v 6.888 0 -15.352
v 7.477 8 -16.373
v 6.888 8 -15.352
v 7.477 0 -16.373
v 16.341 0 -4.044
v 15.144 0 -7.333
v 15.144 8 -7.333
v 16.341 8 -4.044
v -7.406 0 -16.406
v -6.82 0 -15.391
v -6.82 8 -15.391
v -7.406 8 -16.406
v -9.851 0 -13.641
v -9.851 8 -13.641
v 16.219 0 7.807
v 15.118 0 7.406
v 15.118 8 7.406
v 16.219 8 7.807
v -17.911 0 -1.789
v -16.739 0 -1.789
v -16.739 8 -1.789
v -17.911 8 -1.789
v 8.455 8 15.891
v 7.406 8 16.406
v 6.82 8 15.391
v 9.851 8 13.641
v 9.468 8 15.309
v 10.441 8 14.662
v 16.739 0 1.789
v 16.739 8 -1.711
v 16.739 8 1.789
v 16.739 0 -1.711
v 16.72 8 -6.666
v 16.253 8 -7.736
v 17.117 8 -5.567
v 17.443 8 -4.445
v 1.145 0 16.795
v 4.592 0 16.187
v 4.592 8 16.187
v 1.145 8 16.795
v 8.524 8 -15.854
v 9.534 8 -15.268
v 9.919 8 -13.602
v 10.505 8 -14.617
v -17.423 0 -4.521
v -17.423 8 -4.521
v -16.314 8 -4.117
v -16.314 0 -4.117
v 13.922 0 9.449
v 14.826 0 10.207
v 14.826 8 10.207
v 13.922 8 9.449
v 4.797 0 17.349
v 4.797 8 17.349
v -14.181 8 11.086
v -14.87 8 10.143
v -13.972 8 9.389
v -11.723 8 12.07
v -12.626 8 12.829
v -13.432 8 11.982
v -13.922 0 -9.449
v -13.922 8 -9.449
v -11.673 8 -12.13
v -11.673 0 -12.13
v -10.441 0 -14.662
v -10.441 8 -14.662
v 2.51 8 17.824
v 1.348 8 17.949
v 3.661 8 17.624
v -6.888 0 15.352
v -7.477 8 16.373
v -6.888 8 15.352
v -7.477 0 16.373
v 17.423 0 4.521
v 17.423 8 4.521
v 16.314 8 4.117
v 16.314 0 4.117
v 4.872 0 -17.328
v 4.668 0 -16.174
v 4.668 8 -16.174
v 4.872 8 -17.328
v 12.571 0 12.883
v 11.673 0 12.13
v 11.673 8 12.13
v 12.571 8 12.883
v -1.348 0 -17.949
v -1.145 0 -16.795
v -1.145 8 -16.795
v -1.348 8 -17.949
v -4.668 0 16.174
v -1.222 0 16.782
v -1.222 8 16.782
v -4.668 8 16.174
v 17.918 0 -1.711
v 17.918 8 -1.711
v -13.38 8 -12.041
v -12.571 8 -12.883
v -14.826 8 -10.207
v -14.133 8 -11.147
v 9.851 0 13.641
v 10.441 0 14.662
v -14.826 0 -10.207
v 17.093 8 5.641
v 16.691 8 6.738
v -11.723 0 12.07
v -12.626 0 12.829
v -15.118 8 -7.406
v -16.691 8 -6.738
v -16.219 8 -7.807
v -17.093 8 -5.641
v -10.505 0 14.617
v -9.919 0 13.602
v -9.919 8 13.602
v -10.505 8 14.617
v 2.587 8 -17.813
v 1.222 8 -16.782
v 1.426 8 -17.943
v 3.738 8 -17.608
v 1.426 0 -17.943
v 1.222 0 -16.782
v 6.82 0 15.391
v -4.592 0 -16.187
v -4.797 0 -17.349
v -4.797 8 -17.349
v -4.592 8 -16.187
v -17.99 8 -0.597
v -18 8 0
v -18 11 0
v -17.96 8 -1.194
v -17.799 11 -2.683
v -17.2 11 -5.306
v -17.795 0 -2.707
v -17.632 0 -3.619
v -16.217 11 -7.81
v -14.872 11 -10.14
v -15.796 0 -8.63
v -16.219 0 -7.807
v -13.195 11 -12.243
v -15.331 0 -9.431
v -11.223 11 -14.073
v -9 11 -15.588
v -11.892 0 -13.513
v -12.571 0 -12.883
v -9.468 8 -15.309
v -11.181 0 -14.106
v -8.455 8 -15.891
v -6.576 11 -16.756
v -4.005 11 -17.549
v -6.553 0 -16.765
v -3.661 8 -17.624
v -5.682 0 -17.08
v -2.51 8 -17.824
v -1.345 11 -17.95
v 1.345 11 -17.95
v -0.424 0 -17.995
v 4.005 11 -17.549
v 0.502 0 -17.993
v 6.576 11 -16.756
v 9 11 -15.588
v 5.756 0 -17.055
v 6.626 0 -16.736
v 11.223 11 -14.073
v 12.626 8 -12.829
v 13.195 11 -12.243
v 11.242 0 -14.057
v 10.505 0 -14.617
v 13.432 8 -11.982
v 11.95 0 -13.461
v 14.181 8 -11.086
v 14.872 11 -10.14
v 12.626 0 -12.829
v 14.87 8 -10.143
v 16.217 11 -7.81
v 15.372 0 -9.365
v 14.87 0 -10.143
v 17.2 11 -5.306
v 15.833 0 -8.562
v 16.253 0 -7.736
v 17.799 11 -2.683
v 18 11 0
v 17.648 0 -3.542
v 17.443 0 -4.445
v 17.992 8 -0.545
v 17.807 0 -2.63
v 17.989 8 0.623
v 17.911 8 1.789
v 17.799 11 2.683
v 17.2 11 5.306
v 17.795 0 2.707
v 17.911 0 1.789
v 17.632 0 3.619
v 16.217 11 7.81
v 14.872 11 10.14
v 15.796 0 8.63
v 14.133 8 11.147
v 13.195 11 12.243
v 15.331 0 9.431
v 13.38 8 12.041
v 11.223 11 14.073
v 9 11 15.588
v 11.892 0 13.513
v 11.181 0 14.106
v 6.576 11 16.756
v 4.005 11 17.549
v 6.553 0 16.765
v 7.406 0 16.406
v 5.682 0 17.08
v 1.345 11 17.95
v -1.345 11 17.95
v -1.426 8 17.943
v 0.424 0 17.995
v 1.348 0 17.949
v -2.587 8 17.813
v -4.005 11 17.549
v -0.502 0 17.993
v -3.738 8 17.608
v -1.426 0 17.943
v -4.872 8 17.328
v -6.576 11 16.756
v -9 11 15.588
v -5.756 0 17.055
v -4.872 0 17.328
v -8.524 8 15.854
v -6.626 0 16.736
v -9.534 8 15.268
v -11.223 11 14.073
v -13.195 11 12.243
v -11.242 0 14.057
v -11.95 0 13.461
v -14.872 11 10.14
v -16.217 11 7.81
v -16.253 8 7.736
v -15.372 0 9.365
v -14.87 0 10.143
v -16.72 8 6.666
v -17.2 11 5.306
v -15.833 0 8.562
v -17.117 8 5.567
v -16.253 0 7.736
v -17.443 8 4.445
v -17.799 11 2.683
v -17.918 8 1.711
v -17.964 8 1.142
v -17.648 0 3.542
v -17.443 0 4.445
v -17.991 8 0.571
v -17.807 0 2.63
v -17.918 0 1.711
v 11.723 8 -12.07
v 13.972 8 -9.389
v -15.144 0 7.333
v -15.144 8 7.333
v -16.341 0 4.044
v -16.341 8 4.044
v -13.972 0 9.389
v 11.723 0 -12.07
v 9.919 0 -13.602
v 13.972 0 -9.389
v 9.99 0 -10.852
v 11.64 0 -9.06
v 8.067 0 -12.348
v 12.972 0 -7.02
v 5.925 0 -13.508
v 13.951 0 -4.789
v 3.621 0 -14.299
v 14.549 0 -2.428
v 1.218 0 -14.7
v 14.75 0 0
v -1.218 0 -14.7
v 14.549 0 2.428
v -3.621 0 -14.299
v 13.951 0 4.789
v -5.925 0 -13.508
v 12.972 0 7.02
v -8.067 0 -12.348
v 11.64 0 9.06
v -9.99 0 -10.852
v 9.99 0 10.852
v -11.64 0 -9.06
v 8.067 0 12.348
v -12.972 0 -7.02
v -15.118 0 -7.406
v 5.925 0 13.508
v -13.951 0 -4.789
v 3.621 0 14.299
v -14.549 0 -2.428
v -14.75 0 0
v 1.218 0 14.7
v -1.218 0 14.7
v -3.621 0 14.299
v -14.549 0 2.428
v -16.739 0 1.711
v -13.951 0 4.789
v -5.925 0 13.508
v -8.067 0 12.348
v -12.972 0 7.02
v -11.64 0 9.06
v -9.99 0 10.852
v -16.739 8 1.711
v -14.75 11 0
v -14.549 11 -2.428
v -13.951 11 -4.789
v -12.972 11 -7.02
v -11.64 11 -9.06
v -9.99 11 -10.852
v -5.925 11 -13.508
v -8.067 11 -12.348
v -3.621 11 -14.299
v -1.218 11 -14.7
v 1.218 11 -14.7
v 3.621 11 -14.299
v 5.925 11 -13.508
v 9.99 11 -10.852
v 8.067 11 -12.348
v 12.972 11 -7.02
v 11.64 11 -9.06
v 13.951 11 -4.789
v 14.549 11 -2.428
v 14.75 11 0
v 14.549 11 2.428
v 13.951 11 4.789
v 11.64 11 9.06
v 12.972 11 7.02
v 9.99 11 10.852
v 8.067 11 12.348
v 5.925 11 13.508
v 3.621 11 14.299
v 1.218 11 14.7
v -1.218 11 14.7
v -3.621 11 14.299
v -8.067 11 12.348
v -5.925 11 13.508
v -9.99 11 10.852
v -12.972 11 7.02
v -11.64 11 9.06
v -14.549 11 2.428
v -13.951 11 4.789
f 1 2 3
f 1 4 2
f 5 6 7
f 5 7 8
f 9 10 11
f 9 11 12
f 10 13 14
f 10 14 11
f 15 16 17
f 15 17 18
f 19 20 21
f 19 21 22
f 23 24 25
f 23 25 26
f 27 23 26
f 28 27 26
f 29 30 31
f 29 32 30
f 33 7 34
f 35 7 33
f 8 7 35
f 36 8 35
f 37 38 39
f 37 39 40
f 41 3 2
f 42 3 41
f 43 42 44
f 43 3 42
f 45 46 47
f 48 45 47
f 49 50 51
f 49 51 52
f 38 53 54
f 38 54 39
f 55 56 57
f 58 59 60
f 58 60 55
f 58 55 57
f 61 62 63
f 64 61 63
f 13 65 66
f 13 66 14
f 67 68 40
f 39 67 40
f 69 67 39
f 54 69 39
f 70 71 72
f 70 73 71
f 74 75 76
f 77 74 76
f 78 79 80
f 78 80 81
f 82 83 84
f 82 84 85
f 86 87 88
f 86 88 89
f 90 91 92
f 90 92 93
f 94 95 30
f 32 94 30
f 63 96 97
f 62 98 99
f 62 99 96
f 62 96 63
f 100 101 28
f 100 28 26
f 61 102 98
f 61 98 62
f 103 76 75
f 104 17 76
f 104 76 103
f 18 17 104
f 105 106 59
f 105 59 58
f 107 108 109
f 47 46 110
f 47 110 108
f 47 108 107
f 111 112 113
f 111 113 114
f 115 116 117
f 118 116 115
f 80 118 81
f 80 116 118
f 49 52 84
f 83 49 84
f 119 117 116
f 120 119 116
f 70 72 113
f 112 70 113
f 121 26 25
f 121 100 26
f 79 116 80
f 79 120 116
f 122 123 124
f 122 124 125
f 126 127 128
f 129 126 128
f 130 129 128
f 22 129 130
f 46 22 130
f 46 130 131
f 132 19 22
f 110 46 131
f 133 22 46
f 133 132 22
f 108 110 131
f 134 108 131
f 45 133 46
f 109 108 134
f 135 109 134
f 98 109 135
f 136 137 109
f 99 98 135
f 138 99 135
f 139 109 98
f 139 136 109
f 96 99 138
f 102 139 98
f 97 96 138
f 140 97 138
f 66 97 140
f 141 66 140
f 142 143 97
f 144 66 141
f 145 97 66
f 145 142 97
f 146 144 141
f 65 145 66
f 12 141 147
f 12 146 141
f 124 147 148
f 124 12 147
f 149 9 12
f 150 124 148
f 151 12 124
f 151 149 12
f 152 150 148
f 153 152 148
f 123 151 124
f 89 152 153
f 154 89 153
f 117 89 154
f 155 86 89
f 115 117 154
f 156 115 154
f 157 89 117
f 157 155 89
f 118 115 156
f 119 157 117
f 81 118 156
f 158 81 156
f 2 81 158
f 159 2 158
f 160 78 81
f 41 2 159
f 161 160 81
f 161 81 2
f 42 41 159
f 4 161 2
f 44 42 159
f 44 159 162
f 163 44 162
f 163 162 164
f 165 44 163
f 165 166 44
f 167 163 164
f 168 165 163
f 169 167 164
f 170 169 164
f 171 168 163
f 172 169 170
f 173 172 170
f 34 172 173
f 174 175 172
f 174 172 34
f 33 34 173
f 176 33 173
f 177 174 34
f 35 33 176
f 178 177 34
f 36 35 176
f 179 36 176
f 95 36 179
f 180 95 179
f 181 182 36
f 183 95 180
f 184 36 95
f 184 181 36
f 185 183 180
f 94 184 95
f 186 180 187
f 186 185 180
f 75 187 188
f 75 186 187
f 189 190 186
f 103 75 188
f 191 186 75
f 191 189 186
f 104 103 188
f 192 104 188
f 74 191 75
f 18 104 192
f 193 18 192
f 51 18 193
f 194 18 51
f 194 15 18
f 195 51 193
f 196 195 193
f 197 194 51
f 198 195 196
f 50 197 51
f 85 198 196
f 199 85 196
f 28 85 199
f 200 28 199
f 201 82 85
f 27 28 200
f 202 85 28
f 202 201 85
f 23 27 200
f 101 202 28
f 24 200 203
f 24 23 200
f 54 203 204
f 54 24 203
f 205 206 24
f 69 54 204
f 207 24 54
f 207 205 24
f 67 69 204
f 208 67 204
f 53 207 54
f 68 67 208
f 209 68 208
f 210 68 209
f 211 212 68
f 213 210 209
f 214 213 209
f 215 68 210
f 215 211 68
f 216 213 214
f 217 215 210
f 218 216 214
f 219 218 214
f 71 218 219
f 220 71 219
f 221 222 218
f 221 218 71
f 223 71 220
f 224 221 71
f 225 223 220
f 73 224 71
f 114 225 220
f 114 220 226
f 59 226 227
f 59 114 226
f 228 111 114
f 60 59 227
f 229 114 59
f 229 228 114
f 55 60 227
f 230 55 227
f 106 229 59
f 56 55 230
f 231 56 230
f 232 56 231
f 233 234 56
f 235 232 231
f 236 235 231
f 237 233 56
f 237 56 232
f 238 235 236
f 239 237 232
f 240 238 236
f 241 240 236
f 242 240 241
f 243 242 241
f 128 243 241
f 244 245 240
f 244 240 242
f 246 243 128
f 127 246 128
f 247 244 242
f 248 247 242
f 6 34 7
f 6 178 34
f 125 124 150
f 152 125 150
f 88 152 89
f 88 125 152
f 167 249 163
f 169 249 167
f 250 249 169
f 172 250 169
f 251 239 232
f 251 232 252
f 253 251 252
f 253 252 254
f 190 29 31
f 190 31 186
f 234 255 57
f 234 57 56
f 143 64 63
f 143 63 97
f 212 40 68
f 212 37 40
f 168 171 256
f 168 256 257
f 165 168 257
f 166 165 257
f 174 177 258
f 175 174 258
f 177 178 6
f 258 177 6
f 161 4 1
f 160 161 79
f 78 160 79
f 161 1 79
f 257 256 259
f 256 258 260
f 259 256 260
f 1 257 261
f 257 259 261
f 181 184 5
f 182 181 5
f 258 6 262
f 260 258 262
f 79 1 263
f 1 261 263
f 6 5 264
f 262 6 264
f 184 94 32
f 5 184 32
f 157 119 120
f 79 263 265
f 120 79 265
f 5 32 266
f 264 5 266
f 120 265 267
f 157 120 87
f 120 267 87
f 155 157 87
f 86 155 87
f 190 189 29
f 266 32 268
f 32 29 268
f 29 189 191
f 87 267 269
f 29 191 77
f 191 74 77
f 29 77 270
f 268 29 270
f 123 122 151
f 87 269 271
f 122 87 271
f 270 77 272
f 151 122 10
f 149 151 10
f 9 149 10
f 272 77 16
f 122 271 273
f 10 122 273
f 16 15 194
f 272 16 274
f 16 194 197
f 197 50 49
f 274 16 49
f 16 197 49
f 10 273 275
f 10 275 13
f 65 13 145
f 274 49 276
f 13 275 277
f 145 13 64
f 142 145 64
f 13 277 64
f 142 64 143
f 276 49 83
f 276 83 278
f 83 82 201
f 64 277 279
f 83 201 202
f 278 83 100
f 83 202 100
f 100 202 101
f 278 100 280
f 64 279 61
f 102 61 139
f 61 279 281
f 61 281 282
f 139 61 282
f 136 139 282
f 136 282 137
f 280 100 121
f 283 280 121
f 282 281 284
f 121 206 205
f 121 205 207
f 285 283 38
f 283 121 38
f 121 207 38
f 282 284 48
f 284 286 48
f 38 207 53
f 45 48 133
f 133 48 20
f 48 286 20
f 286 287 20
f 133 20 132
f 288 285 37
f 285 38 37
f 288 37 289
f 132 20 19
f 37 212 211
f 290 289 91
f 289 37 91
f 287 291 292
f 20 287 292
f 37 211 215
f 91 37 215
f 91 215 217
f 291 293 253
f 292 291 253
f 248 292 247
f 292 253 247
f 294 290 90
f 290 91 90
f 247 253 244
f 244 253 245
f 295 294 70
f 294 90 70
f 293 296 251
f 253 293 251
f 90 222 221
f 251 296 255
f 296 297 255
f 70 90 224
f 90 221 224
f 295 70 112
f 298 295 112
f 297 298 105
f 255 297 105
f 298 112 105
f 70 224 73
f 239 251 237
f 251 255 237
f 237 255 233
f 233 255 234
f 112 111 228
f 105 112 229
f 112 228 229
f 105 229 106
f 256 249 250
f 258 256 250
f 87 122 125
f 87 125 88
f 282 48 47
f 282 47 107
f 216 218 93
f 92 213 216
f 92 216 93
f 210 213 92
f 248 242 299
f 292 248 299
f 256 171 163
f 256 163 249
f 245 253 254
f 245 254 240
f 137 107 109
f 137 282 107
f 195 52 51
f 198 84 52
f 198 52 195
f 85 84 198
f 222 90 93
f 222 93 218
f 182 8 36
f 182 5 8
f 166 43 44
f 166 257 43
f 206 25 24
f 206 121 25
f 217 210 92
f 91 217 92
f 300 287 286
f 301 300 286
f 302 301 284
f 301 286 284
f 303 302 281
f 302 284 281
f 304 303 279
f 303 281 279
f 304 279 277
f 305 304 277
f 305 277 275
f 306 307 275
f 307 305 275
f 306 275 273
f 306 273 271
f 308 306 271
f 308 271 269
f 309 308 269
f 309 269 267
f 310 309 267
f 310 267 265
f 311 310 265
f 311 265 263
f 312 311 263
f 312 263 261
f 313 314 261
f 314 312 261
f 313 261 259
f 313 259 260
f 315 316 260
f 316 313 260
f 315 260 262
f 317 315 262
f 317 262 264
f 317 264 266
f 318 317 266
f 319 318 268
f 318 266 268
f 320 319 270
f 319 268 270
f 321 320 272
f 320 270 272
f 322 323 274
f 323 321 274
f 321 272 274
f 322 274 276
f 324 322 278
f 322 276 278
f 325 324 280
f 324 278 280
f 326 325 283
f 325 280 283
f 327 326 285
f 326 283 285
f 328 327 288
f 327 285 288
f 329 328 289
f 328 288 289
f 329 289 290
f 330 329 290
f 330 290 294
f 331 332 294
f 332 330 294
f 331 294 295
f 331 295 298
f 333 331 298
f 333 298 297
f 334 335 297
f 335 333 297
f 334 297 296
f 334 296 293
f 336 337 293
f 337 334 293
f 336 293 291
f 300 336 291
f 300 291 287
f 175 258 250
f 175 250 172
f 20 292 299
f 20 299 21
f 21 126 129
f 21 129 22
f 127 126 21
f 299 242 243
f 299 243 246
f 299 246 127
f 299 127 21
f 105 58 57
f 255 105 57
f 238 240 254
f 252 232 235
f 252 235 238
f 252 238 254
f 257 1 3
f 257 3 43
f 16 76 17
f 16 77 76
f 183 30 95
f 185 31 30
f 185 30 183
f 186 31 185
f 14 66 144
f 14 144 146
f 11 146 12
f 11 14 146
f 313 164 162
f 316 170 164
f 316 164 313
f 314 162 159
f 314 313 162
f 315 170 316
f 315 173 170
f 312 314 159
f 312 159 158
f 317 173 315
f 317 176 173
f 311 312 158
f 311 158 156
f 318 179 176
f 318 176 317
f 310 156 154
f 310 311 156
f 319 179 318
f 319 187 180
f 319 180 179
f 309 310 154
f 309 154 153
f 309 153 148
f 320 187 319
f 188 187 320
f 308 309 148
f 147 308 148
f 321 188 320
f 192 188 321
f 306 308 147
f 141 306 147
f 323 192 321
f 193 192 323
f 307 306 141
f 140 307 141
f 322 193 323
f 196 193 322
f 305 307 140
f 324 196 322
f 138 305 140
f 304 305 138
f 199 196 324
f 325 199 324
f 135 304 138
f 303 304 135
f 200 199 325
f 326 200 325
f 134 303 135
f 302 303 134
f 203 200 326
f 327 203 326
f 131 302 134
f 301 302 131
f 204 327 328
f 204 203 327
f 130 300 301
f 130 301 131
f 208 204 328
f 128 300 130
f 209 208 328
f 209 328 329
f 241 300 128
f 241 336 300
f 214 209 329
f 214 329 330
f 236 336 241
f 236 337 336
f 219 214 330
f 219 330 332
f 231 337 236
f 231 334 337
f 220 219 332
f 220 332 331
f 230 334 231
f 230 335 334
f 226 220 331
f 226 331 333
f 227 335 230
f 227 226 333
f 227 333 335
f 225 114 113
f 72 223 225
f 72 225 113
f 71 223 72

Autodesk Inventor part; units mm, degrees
ref_plane "YZ Plane" through (0, 0, 0) normal (1, 0, 0) x (0, 1, 0)
ref_plane "XZ Plane" through (0, 0, 0) normal (0, 1, 0) x (-1, 0, 0)
ref_plane "XY Plane" through (0, 0, 0) normal (0, 0, 1) x (1, 0, 0)
sketch "Sketch1" plane through (0, 0, 0) normal (0, 1, 0) x (-1, 0, 0)
  circle A0 centre (0, 0) radius 14.75
  circle A1 centre (0, 0) radius 18
  dimension "d0" = 29.5
  dimension "d1" = 36
extrude "Extrusion1" add sketch "Sketch1" along normal blind 11
thread "Thread1" size "M30x1" class "6H" standard "ANSI Metric M Profile" full length
sketch "Sketch2" plane through (0, 0, 0) normal (0, -1, 0) x (1, 0, 0)
  circle A0 centre (0, 0) radius 14.75 projected
  line L0 (-18.761, 1.7111) -> (-16.7388, 1.7111)
  line L1 (-16.7388, 1.7111) -> (-16.7388, -1.7889)
  line L2 (-16.7388, -1.7889) -> (-18.761, -1.7889)
  line L3 (-18.761, -1.7889) -> (-18.761, 1.7111)
  line L4 (-18.2148, -4.8087) -> (-16.3145, -4.1171)
  line L5 (-16.3145, -4.1171) -> (-15.1175, -7.406)
  line L6 (-15.1175, -7.406) -> (-17.0177, -8.0976)
  line L7 (-17.0177, -8.0976) -> (-18.2148, -4.8087)
  line L8 (-15.4716, -10.7485) -> (-13.9225, -9.4487)
  line L9 (-13.9225, -9.4487) -> (-11.6728, -12.1298)
  line L10 (-11.6728, -12.1298) -> (-13.2219, -13.4297)
  line L11 (-13.2219, -13.4297) -> (-15.4716, -10.7485)
  line L12 (-10.8624, -15.3919) -> (-9.8512, -13.6406)
  line L13 (-9.8512, -13.6406) -> (-6.8202, -15.3906)
  line L14 (-6.8202, -15.3906) -> (-7.8313, -17.1419)
  line L15 (-7.8313, -17.1419) -> (-10.8624, -15.3919)
  line L16 (-4.9429, -18.1788) -> (-4.5918, -16.1873)
  line L17 (-4.5918, -16.1873) -> (-1.1449, -16.7951)
  line L18 (-1.1449, -16.7951) -> (-1.4961, -18.7866)
  line L19 (-1.4961, -18.7866) -> (-4.9429, -18.1788)
  line L20 (1.5727, -18.7731) -> (1.2215, -16.7816)
  line L21 (1.2215, -16.7816) -> (4.6684, -16.1738)
  line L22 (4.6684, -16.1738) -> (5.0195, -18.1653)
  line L23 (5.0195, -18.1653) -> (1.5727, -18.7731)
  line L24 (7.8986, -17.103) -> (6.8875, -15.3517)
  line L25 (6.8875, -15.3517) -> (9.9186, -13.6017)
  line L26 (9.9186, -13.6017) -> (10.9297, -15.353)
  line L27 (10.9297, -15.353) -> (7.8986, -17.103)
  line L28 (13.2719, -13.3701) -> (11.7228, -12.0703)
  line L29 (11.7228, -12.0703) -> (13.9725, -9.3891)
  line L30 (13.9725, -9.3891) -> (15.5216, -10.689)
  line L31 (15.5216, -10.689) -> (13.2719, -13.3701)
  line L32 (17.0443, -8.0246) -> (15.1441, -7.3329)
  line L33 (15.1441, -7.3329) -> (16.3411, -4.044)
  line L34 (16.3411, -4.044) -> (18.2414, -4.7356)
  line L35 (18.2414, -4.7356) -> (17.0443, -8.0246)
  line L36 (18.761, -1.7111) -> (16.7388, -1.7111)
  line L37 (16.7388, -1.7111) -> (16.7388, 1.7889)
  line L38 (16.7388, 1.7889) -> (18.761, 1.7889)
  line L39 (18.761, 1.7889) -> (18.761, -1.7111)
  line L40 (18.2148, 4.8087) -> (16.3145, 4.1171)
  line L41 (16.3145, 4.1171) -> (15.1175, 7.406)
  line L42 (15.1175, 7.406) -> (17.0177, 8.0976)
  line L43 (17.0177, 8.0976) -> (18.2148, 4.8087)
  line L44 (15.4716, 10.7485) -> (13.9225, 9.4487)
  line L45 (13.9225, 9.4487) -> (11.6728, 12.1298)
  line L46 (11.6728, 12.1298) -> (13.2219, 13.4297)
  line L47 (13.2219, 13.4297) -> (15.4716, 10.7485)
  line L48 (10.8624, 15.3919) -> (9.8512, 13.6406)
  line L49 (9.8512, 13.6406) -> (6.8202, 15.3906)
  line L50 (6.8202, 15.3906) -> (7.8313, 17.1419)
  line L51 (7.8313, 17.1419) -> (10.8624, 15.3919)
  line L52 (4.9429, 18.1788) -> (4.5918, 16.1873)
  line L53 (4.5918, 16.1873) -> (1.1449, 16.7951)
  line L54 (1.1449, 16.7951) -> (1.4961, 18.7866)
  line L55 (1.4961, 18.7866) -> (4.9429, 18.1788)
  line L56 (-1.5727, 18.7731) -> (-1.2215, 16.7816)
  line L57 (-1.2215, 16.7816) -> (-4.6684, 16.1738)
  line L58 (-4.6684, 16.1738) -> (-5.0195, 18.1653)
  line L59 (-5.0195, 18.1653) -> (-1.5727, 18.7731)
  line L60 (-7.8986, 17.103) -> (-6.8875, 15.3517)
  line L61 (-6.8875, 15.3517) -> (-9.9186, 13.6017)
  line L62 (-9.9186, 13.6017) -> (-10.9297, 15.353)
  line L63 (-10.9297, 15.353) -> (-7.8986, 17.103)
  line L64 (-13.2719, 13.3701) -> (-11.7228, 12.0703)
  line L65 (-11.7228, 12.0703) -> (-13.9725, 9.3891)
  line L66 (-13.9725, 9.3891) -> (-15.5216, 10.689)
  line L67 (-15.5216, 10.689) -> (-13.2719, 13.3701)
  line L68 (-17.0443, 8.0246) -> (-15.1441, 7.3329)
  line L69 (-15.1441, 7.3329) -> (-16.3411, 4.044)
  line L70 (-16.3411, 4.044) -> (-18.2414, 4.7356)
  line L71 (-18.2414, 4.7356) -> (-17.0443, 8.0246)
  dimension "d6" = 3.5
  dimension "d10" = 360
extrude "Extrusion2" cut sketch "Sketch2" against normal blind 8 contours L0 L1 L2 L3 | L4 L5 L6 L7 | L8 L9 L10 L11 | L12 L13 L14 L15 | L16 L17 L18 L19 | L20 L21 L22 L23 | L24 L25 L26 L27 | L28 L29 L30 L31 | L32 L33 L34 L35 | L36 L37 L38 L39 | L40 L41 L42 L43 | L44 L45 L46 L47 | L48 L49 L50 L51 | L52 L53 L54 L55 | L56 L57 L58 L59 | L60 L61 L62 L63 | L64 L65 L66 L67 | L68 L69 L70 L71
properties part number "OBSN-30-B_ring" material "Nylon 6"
